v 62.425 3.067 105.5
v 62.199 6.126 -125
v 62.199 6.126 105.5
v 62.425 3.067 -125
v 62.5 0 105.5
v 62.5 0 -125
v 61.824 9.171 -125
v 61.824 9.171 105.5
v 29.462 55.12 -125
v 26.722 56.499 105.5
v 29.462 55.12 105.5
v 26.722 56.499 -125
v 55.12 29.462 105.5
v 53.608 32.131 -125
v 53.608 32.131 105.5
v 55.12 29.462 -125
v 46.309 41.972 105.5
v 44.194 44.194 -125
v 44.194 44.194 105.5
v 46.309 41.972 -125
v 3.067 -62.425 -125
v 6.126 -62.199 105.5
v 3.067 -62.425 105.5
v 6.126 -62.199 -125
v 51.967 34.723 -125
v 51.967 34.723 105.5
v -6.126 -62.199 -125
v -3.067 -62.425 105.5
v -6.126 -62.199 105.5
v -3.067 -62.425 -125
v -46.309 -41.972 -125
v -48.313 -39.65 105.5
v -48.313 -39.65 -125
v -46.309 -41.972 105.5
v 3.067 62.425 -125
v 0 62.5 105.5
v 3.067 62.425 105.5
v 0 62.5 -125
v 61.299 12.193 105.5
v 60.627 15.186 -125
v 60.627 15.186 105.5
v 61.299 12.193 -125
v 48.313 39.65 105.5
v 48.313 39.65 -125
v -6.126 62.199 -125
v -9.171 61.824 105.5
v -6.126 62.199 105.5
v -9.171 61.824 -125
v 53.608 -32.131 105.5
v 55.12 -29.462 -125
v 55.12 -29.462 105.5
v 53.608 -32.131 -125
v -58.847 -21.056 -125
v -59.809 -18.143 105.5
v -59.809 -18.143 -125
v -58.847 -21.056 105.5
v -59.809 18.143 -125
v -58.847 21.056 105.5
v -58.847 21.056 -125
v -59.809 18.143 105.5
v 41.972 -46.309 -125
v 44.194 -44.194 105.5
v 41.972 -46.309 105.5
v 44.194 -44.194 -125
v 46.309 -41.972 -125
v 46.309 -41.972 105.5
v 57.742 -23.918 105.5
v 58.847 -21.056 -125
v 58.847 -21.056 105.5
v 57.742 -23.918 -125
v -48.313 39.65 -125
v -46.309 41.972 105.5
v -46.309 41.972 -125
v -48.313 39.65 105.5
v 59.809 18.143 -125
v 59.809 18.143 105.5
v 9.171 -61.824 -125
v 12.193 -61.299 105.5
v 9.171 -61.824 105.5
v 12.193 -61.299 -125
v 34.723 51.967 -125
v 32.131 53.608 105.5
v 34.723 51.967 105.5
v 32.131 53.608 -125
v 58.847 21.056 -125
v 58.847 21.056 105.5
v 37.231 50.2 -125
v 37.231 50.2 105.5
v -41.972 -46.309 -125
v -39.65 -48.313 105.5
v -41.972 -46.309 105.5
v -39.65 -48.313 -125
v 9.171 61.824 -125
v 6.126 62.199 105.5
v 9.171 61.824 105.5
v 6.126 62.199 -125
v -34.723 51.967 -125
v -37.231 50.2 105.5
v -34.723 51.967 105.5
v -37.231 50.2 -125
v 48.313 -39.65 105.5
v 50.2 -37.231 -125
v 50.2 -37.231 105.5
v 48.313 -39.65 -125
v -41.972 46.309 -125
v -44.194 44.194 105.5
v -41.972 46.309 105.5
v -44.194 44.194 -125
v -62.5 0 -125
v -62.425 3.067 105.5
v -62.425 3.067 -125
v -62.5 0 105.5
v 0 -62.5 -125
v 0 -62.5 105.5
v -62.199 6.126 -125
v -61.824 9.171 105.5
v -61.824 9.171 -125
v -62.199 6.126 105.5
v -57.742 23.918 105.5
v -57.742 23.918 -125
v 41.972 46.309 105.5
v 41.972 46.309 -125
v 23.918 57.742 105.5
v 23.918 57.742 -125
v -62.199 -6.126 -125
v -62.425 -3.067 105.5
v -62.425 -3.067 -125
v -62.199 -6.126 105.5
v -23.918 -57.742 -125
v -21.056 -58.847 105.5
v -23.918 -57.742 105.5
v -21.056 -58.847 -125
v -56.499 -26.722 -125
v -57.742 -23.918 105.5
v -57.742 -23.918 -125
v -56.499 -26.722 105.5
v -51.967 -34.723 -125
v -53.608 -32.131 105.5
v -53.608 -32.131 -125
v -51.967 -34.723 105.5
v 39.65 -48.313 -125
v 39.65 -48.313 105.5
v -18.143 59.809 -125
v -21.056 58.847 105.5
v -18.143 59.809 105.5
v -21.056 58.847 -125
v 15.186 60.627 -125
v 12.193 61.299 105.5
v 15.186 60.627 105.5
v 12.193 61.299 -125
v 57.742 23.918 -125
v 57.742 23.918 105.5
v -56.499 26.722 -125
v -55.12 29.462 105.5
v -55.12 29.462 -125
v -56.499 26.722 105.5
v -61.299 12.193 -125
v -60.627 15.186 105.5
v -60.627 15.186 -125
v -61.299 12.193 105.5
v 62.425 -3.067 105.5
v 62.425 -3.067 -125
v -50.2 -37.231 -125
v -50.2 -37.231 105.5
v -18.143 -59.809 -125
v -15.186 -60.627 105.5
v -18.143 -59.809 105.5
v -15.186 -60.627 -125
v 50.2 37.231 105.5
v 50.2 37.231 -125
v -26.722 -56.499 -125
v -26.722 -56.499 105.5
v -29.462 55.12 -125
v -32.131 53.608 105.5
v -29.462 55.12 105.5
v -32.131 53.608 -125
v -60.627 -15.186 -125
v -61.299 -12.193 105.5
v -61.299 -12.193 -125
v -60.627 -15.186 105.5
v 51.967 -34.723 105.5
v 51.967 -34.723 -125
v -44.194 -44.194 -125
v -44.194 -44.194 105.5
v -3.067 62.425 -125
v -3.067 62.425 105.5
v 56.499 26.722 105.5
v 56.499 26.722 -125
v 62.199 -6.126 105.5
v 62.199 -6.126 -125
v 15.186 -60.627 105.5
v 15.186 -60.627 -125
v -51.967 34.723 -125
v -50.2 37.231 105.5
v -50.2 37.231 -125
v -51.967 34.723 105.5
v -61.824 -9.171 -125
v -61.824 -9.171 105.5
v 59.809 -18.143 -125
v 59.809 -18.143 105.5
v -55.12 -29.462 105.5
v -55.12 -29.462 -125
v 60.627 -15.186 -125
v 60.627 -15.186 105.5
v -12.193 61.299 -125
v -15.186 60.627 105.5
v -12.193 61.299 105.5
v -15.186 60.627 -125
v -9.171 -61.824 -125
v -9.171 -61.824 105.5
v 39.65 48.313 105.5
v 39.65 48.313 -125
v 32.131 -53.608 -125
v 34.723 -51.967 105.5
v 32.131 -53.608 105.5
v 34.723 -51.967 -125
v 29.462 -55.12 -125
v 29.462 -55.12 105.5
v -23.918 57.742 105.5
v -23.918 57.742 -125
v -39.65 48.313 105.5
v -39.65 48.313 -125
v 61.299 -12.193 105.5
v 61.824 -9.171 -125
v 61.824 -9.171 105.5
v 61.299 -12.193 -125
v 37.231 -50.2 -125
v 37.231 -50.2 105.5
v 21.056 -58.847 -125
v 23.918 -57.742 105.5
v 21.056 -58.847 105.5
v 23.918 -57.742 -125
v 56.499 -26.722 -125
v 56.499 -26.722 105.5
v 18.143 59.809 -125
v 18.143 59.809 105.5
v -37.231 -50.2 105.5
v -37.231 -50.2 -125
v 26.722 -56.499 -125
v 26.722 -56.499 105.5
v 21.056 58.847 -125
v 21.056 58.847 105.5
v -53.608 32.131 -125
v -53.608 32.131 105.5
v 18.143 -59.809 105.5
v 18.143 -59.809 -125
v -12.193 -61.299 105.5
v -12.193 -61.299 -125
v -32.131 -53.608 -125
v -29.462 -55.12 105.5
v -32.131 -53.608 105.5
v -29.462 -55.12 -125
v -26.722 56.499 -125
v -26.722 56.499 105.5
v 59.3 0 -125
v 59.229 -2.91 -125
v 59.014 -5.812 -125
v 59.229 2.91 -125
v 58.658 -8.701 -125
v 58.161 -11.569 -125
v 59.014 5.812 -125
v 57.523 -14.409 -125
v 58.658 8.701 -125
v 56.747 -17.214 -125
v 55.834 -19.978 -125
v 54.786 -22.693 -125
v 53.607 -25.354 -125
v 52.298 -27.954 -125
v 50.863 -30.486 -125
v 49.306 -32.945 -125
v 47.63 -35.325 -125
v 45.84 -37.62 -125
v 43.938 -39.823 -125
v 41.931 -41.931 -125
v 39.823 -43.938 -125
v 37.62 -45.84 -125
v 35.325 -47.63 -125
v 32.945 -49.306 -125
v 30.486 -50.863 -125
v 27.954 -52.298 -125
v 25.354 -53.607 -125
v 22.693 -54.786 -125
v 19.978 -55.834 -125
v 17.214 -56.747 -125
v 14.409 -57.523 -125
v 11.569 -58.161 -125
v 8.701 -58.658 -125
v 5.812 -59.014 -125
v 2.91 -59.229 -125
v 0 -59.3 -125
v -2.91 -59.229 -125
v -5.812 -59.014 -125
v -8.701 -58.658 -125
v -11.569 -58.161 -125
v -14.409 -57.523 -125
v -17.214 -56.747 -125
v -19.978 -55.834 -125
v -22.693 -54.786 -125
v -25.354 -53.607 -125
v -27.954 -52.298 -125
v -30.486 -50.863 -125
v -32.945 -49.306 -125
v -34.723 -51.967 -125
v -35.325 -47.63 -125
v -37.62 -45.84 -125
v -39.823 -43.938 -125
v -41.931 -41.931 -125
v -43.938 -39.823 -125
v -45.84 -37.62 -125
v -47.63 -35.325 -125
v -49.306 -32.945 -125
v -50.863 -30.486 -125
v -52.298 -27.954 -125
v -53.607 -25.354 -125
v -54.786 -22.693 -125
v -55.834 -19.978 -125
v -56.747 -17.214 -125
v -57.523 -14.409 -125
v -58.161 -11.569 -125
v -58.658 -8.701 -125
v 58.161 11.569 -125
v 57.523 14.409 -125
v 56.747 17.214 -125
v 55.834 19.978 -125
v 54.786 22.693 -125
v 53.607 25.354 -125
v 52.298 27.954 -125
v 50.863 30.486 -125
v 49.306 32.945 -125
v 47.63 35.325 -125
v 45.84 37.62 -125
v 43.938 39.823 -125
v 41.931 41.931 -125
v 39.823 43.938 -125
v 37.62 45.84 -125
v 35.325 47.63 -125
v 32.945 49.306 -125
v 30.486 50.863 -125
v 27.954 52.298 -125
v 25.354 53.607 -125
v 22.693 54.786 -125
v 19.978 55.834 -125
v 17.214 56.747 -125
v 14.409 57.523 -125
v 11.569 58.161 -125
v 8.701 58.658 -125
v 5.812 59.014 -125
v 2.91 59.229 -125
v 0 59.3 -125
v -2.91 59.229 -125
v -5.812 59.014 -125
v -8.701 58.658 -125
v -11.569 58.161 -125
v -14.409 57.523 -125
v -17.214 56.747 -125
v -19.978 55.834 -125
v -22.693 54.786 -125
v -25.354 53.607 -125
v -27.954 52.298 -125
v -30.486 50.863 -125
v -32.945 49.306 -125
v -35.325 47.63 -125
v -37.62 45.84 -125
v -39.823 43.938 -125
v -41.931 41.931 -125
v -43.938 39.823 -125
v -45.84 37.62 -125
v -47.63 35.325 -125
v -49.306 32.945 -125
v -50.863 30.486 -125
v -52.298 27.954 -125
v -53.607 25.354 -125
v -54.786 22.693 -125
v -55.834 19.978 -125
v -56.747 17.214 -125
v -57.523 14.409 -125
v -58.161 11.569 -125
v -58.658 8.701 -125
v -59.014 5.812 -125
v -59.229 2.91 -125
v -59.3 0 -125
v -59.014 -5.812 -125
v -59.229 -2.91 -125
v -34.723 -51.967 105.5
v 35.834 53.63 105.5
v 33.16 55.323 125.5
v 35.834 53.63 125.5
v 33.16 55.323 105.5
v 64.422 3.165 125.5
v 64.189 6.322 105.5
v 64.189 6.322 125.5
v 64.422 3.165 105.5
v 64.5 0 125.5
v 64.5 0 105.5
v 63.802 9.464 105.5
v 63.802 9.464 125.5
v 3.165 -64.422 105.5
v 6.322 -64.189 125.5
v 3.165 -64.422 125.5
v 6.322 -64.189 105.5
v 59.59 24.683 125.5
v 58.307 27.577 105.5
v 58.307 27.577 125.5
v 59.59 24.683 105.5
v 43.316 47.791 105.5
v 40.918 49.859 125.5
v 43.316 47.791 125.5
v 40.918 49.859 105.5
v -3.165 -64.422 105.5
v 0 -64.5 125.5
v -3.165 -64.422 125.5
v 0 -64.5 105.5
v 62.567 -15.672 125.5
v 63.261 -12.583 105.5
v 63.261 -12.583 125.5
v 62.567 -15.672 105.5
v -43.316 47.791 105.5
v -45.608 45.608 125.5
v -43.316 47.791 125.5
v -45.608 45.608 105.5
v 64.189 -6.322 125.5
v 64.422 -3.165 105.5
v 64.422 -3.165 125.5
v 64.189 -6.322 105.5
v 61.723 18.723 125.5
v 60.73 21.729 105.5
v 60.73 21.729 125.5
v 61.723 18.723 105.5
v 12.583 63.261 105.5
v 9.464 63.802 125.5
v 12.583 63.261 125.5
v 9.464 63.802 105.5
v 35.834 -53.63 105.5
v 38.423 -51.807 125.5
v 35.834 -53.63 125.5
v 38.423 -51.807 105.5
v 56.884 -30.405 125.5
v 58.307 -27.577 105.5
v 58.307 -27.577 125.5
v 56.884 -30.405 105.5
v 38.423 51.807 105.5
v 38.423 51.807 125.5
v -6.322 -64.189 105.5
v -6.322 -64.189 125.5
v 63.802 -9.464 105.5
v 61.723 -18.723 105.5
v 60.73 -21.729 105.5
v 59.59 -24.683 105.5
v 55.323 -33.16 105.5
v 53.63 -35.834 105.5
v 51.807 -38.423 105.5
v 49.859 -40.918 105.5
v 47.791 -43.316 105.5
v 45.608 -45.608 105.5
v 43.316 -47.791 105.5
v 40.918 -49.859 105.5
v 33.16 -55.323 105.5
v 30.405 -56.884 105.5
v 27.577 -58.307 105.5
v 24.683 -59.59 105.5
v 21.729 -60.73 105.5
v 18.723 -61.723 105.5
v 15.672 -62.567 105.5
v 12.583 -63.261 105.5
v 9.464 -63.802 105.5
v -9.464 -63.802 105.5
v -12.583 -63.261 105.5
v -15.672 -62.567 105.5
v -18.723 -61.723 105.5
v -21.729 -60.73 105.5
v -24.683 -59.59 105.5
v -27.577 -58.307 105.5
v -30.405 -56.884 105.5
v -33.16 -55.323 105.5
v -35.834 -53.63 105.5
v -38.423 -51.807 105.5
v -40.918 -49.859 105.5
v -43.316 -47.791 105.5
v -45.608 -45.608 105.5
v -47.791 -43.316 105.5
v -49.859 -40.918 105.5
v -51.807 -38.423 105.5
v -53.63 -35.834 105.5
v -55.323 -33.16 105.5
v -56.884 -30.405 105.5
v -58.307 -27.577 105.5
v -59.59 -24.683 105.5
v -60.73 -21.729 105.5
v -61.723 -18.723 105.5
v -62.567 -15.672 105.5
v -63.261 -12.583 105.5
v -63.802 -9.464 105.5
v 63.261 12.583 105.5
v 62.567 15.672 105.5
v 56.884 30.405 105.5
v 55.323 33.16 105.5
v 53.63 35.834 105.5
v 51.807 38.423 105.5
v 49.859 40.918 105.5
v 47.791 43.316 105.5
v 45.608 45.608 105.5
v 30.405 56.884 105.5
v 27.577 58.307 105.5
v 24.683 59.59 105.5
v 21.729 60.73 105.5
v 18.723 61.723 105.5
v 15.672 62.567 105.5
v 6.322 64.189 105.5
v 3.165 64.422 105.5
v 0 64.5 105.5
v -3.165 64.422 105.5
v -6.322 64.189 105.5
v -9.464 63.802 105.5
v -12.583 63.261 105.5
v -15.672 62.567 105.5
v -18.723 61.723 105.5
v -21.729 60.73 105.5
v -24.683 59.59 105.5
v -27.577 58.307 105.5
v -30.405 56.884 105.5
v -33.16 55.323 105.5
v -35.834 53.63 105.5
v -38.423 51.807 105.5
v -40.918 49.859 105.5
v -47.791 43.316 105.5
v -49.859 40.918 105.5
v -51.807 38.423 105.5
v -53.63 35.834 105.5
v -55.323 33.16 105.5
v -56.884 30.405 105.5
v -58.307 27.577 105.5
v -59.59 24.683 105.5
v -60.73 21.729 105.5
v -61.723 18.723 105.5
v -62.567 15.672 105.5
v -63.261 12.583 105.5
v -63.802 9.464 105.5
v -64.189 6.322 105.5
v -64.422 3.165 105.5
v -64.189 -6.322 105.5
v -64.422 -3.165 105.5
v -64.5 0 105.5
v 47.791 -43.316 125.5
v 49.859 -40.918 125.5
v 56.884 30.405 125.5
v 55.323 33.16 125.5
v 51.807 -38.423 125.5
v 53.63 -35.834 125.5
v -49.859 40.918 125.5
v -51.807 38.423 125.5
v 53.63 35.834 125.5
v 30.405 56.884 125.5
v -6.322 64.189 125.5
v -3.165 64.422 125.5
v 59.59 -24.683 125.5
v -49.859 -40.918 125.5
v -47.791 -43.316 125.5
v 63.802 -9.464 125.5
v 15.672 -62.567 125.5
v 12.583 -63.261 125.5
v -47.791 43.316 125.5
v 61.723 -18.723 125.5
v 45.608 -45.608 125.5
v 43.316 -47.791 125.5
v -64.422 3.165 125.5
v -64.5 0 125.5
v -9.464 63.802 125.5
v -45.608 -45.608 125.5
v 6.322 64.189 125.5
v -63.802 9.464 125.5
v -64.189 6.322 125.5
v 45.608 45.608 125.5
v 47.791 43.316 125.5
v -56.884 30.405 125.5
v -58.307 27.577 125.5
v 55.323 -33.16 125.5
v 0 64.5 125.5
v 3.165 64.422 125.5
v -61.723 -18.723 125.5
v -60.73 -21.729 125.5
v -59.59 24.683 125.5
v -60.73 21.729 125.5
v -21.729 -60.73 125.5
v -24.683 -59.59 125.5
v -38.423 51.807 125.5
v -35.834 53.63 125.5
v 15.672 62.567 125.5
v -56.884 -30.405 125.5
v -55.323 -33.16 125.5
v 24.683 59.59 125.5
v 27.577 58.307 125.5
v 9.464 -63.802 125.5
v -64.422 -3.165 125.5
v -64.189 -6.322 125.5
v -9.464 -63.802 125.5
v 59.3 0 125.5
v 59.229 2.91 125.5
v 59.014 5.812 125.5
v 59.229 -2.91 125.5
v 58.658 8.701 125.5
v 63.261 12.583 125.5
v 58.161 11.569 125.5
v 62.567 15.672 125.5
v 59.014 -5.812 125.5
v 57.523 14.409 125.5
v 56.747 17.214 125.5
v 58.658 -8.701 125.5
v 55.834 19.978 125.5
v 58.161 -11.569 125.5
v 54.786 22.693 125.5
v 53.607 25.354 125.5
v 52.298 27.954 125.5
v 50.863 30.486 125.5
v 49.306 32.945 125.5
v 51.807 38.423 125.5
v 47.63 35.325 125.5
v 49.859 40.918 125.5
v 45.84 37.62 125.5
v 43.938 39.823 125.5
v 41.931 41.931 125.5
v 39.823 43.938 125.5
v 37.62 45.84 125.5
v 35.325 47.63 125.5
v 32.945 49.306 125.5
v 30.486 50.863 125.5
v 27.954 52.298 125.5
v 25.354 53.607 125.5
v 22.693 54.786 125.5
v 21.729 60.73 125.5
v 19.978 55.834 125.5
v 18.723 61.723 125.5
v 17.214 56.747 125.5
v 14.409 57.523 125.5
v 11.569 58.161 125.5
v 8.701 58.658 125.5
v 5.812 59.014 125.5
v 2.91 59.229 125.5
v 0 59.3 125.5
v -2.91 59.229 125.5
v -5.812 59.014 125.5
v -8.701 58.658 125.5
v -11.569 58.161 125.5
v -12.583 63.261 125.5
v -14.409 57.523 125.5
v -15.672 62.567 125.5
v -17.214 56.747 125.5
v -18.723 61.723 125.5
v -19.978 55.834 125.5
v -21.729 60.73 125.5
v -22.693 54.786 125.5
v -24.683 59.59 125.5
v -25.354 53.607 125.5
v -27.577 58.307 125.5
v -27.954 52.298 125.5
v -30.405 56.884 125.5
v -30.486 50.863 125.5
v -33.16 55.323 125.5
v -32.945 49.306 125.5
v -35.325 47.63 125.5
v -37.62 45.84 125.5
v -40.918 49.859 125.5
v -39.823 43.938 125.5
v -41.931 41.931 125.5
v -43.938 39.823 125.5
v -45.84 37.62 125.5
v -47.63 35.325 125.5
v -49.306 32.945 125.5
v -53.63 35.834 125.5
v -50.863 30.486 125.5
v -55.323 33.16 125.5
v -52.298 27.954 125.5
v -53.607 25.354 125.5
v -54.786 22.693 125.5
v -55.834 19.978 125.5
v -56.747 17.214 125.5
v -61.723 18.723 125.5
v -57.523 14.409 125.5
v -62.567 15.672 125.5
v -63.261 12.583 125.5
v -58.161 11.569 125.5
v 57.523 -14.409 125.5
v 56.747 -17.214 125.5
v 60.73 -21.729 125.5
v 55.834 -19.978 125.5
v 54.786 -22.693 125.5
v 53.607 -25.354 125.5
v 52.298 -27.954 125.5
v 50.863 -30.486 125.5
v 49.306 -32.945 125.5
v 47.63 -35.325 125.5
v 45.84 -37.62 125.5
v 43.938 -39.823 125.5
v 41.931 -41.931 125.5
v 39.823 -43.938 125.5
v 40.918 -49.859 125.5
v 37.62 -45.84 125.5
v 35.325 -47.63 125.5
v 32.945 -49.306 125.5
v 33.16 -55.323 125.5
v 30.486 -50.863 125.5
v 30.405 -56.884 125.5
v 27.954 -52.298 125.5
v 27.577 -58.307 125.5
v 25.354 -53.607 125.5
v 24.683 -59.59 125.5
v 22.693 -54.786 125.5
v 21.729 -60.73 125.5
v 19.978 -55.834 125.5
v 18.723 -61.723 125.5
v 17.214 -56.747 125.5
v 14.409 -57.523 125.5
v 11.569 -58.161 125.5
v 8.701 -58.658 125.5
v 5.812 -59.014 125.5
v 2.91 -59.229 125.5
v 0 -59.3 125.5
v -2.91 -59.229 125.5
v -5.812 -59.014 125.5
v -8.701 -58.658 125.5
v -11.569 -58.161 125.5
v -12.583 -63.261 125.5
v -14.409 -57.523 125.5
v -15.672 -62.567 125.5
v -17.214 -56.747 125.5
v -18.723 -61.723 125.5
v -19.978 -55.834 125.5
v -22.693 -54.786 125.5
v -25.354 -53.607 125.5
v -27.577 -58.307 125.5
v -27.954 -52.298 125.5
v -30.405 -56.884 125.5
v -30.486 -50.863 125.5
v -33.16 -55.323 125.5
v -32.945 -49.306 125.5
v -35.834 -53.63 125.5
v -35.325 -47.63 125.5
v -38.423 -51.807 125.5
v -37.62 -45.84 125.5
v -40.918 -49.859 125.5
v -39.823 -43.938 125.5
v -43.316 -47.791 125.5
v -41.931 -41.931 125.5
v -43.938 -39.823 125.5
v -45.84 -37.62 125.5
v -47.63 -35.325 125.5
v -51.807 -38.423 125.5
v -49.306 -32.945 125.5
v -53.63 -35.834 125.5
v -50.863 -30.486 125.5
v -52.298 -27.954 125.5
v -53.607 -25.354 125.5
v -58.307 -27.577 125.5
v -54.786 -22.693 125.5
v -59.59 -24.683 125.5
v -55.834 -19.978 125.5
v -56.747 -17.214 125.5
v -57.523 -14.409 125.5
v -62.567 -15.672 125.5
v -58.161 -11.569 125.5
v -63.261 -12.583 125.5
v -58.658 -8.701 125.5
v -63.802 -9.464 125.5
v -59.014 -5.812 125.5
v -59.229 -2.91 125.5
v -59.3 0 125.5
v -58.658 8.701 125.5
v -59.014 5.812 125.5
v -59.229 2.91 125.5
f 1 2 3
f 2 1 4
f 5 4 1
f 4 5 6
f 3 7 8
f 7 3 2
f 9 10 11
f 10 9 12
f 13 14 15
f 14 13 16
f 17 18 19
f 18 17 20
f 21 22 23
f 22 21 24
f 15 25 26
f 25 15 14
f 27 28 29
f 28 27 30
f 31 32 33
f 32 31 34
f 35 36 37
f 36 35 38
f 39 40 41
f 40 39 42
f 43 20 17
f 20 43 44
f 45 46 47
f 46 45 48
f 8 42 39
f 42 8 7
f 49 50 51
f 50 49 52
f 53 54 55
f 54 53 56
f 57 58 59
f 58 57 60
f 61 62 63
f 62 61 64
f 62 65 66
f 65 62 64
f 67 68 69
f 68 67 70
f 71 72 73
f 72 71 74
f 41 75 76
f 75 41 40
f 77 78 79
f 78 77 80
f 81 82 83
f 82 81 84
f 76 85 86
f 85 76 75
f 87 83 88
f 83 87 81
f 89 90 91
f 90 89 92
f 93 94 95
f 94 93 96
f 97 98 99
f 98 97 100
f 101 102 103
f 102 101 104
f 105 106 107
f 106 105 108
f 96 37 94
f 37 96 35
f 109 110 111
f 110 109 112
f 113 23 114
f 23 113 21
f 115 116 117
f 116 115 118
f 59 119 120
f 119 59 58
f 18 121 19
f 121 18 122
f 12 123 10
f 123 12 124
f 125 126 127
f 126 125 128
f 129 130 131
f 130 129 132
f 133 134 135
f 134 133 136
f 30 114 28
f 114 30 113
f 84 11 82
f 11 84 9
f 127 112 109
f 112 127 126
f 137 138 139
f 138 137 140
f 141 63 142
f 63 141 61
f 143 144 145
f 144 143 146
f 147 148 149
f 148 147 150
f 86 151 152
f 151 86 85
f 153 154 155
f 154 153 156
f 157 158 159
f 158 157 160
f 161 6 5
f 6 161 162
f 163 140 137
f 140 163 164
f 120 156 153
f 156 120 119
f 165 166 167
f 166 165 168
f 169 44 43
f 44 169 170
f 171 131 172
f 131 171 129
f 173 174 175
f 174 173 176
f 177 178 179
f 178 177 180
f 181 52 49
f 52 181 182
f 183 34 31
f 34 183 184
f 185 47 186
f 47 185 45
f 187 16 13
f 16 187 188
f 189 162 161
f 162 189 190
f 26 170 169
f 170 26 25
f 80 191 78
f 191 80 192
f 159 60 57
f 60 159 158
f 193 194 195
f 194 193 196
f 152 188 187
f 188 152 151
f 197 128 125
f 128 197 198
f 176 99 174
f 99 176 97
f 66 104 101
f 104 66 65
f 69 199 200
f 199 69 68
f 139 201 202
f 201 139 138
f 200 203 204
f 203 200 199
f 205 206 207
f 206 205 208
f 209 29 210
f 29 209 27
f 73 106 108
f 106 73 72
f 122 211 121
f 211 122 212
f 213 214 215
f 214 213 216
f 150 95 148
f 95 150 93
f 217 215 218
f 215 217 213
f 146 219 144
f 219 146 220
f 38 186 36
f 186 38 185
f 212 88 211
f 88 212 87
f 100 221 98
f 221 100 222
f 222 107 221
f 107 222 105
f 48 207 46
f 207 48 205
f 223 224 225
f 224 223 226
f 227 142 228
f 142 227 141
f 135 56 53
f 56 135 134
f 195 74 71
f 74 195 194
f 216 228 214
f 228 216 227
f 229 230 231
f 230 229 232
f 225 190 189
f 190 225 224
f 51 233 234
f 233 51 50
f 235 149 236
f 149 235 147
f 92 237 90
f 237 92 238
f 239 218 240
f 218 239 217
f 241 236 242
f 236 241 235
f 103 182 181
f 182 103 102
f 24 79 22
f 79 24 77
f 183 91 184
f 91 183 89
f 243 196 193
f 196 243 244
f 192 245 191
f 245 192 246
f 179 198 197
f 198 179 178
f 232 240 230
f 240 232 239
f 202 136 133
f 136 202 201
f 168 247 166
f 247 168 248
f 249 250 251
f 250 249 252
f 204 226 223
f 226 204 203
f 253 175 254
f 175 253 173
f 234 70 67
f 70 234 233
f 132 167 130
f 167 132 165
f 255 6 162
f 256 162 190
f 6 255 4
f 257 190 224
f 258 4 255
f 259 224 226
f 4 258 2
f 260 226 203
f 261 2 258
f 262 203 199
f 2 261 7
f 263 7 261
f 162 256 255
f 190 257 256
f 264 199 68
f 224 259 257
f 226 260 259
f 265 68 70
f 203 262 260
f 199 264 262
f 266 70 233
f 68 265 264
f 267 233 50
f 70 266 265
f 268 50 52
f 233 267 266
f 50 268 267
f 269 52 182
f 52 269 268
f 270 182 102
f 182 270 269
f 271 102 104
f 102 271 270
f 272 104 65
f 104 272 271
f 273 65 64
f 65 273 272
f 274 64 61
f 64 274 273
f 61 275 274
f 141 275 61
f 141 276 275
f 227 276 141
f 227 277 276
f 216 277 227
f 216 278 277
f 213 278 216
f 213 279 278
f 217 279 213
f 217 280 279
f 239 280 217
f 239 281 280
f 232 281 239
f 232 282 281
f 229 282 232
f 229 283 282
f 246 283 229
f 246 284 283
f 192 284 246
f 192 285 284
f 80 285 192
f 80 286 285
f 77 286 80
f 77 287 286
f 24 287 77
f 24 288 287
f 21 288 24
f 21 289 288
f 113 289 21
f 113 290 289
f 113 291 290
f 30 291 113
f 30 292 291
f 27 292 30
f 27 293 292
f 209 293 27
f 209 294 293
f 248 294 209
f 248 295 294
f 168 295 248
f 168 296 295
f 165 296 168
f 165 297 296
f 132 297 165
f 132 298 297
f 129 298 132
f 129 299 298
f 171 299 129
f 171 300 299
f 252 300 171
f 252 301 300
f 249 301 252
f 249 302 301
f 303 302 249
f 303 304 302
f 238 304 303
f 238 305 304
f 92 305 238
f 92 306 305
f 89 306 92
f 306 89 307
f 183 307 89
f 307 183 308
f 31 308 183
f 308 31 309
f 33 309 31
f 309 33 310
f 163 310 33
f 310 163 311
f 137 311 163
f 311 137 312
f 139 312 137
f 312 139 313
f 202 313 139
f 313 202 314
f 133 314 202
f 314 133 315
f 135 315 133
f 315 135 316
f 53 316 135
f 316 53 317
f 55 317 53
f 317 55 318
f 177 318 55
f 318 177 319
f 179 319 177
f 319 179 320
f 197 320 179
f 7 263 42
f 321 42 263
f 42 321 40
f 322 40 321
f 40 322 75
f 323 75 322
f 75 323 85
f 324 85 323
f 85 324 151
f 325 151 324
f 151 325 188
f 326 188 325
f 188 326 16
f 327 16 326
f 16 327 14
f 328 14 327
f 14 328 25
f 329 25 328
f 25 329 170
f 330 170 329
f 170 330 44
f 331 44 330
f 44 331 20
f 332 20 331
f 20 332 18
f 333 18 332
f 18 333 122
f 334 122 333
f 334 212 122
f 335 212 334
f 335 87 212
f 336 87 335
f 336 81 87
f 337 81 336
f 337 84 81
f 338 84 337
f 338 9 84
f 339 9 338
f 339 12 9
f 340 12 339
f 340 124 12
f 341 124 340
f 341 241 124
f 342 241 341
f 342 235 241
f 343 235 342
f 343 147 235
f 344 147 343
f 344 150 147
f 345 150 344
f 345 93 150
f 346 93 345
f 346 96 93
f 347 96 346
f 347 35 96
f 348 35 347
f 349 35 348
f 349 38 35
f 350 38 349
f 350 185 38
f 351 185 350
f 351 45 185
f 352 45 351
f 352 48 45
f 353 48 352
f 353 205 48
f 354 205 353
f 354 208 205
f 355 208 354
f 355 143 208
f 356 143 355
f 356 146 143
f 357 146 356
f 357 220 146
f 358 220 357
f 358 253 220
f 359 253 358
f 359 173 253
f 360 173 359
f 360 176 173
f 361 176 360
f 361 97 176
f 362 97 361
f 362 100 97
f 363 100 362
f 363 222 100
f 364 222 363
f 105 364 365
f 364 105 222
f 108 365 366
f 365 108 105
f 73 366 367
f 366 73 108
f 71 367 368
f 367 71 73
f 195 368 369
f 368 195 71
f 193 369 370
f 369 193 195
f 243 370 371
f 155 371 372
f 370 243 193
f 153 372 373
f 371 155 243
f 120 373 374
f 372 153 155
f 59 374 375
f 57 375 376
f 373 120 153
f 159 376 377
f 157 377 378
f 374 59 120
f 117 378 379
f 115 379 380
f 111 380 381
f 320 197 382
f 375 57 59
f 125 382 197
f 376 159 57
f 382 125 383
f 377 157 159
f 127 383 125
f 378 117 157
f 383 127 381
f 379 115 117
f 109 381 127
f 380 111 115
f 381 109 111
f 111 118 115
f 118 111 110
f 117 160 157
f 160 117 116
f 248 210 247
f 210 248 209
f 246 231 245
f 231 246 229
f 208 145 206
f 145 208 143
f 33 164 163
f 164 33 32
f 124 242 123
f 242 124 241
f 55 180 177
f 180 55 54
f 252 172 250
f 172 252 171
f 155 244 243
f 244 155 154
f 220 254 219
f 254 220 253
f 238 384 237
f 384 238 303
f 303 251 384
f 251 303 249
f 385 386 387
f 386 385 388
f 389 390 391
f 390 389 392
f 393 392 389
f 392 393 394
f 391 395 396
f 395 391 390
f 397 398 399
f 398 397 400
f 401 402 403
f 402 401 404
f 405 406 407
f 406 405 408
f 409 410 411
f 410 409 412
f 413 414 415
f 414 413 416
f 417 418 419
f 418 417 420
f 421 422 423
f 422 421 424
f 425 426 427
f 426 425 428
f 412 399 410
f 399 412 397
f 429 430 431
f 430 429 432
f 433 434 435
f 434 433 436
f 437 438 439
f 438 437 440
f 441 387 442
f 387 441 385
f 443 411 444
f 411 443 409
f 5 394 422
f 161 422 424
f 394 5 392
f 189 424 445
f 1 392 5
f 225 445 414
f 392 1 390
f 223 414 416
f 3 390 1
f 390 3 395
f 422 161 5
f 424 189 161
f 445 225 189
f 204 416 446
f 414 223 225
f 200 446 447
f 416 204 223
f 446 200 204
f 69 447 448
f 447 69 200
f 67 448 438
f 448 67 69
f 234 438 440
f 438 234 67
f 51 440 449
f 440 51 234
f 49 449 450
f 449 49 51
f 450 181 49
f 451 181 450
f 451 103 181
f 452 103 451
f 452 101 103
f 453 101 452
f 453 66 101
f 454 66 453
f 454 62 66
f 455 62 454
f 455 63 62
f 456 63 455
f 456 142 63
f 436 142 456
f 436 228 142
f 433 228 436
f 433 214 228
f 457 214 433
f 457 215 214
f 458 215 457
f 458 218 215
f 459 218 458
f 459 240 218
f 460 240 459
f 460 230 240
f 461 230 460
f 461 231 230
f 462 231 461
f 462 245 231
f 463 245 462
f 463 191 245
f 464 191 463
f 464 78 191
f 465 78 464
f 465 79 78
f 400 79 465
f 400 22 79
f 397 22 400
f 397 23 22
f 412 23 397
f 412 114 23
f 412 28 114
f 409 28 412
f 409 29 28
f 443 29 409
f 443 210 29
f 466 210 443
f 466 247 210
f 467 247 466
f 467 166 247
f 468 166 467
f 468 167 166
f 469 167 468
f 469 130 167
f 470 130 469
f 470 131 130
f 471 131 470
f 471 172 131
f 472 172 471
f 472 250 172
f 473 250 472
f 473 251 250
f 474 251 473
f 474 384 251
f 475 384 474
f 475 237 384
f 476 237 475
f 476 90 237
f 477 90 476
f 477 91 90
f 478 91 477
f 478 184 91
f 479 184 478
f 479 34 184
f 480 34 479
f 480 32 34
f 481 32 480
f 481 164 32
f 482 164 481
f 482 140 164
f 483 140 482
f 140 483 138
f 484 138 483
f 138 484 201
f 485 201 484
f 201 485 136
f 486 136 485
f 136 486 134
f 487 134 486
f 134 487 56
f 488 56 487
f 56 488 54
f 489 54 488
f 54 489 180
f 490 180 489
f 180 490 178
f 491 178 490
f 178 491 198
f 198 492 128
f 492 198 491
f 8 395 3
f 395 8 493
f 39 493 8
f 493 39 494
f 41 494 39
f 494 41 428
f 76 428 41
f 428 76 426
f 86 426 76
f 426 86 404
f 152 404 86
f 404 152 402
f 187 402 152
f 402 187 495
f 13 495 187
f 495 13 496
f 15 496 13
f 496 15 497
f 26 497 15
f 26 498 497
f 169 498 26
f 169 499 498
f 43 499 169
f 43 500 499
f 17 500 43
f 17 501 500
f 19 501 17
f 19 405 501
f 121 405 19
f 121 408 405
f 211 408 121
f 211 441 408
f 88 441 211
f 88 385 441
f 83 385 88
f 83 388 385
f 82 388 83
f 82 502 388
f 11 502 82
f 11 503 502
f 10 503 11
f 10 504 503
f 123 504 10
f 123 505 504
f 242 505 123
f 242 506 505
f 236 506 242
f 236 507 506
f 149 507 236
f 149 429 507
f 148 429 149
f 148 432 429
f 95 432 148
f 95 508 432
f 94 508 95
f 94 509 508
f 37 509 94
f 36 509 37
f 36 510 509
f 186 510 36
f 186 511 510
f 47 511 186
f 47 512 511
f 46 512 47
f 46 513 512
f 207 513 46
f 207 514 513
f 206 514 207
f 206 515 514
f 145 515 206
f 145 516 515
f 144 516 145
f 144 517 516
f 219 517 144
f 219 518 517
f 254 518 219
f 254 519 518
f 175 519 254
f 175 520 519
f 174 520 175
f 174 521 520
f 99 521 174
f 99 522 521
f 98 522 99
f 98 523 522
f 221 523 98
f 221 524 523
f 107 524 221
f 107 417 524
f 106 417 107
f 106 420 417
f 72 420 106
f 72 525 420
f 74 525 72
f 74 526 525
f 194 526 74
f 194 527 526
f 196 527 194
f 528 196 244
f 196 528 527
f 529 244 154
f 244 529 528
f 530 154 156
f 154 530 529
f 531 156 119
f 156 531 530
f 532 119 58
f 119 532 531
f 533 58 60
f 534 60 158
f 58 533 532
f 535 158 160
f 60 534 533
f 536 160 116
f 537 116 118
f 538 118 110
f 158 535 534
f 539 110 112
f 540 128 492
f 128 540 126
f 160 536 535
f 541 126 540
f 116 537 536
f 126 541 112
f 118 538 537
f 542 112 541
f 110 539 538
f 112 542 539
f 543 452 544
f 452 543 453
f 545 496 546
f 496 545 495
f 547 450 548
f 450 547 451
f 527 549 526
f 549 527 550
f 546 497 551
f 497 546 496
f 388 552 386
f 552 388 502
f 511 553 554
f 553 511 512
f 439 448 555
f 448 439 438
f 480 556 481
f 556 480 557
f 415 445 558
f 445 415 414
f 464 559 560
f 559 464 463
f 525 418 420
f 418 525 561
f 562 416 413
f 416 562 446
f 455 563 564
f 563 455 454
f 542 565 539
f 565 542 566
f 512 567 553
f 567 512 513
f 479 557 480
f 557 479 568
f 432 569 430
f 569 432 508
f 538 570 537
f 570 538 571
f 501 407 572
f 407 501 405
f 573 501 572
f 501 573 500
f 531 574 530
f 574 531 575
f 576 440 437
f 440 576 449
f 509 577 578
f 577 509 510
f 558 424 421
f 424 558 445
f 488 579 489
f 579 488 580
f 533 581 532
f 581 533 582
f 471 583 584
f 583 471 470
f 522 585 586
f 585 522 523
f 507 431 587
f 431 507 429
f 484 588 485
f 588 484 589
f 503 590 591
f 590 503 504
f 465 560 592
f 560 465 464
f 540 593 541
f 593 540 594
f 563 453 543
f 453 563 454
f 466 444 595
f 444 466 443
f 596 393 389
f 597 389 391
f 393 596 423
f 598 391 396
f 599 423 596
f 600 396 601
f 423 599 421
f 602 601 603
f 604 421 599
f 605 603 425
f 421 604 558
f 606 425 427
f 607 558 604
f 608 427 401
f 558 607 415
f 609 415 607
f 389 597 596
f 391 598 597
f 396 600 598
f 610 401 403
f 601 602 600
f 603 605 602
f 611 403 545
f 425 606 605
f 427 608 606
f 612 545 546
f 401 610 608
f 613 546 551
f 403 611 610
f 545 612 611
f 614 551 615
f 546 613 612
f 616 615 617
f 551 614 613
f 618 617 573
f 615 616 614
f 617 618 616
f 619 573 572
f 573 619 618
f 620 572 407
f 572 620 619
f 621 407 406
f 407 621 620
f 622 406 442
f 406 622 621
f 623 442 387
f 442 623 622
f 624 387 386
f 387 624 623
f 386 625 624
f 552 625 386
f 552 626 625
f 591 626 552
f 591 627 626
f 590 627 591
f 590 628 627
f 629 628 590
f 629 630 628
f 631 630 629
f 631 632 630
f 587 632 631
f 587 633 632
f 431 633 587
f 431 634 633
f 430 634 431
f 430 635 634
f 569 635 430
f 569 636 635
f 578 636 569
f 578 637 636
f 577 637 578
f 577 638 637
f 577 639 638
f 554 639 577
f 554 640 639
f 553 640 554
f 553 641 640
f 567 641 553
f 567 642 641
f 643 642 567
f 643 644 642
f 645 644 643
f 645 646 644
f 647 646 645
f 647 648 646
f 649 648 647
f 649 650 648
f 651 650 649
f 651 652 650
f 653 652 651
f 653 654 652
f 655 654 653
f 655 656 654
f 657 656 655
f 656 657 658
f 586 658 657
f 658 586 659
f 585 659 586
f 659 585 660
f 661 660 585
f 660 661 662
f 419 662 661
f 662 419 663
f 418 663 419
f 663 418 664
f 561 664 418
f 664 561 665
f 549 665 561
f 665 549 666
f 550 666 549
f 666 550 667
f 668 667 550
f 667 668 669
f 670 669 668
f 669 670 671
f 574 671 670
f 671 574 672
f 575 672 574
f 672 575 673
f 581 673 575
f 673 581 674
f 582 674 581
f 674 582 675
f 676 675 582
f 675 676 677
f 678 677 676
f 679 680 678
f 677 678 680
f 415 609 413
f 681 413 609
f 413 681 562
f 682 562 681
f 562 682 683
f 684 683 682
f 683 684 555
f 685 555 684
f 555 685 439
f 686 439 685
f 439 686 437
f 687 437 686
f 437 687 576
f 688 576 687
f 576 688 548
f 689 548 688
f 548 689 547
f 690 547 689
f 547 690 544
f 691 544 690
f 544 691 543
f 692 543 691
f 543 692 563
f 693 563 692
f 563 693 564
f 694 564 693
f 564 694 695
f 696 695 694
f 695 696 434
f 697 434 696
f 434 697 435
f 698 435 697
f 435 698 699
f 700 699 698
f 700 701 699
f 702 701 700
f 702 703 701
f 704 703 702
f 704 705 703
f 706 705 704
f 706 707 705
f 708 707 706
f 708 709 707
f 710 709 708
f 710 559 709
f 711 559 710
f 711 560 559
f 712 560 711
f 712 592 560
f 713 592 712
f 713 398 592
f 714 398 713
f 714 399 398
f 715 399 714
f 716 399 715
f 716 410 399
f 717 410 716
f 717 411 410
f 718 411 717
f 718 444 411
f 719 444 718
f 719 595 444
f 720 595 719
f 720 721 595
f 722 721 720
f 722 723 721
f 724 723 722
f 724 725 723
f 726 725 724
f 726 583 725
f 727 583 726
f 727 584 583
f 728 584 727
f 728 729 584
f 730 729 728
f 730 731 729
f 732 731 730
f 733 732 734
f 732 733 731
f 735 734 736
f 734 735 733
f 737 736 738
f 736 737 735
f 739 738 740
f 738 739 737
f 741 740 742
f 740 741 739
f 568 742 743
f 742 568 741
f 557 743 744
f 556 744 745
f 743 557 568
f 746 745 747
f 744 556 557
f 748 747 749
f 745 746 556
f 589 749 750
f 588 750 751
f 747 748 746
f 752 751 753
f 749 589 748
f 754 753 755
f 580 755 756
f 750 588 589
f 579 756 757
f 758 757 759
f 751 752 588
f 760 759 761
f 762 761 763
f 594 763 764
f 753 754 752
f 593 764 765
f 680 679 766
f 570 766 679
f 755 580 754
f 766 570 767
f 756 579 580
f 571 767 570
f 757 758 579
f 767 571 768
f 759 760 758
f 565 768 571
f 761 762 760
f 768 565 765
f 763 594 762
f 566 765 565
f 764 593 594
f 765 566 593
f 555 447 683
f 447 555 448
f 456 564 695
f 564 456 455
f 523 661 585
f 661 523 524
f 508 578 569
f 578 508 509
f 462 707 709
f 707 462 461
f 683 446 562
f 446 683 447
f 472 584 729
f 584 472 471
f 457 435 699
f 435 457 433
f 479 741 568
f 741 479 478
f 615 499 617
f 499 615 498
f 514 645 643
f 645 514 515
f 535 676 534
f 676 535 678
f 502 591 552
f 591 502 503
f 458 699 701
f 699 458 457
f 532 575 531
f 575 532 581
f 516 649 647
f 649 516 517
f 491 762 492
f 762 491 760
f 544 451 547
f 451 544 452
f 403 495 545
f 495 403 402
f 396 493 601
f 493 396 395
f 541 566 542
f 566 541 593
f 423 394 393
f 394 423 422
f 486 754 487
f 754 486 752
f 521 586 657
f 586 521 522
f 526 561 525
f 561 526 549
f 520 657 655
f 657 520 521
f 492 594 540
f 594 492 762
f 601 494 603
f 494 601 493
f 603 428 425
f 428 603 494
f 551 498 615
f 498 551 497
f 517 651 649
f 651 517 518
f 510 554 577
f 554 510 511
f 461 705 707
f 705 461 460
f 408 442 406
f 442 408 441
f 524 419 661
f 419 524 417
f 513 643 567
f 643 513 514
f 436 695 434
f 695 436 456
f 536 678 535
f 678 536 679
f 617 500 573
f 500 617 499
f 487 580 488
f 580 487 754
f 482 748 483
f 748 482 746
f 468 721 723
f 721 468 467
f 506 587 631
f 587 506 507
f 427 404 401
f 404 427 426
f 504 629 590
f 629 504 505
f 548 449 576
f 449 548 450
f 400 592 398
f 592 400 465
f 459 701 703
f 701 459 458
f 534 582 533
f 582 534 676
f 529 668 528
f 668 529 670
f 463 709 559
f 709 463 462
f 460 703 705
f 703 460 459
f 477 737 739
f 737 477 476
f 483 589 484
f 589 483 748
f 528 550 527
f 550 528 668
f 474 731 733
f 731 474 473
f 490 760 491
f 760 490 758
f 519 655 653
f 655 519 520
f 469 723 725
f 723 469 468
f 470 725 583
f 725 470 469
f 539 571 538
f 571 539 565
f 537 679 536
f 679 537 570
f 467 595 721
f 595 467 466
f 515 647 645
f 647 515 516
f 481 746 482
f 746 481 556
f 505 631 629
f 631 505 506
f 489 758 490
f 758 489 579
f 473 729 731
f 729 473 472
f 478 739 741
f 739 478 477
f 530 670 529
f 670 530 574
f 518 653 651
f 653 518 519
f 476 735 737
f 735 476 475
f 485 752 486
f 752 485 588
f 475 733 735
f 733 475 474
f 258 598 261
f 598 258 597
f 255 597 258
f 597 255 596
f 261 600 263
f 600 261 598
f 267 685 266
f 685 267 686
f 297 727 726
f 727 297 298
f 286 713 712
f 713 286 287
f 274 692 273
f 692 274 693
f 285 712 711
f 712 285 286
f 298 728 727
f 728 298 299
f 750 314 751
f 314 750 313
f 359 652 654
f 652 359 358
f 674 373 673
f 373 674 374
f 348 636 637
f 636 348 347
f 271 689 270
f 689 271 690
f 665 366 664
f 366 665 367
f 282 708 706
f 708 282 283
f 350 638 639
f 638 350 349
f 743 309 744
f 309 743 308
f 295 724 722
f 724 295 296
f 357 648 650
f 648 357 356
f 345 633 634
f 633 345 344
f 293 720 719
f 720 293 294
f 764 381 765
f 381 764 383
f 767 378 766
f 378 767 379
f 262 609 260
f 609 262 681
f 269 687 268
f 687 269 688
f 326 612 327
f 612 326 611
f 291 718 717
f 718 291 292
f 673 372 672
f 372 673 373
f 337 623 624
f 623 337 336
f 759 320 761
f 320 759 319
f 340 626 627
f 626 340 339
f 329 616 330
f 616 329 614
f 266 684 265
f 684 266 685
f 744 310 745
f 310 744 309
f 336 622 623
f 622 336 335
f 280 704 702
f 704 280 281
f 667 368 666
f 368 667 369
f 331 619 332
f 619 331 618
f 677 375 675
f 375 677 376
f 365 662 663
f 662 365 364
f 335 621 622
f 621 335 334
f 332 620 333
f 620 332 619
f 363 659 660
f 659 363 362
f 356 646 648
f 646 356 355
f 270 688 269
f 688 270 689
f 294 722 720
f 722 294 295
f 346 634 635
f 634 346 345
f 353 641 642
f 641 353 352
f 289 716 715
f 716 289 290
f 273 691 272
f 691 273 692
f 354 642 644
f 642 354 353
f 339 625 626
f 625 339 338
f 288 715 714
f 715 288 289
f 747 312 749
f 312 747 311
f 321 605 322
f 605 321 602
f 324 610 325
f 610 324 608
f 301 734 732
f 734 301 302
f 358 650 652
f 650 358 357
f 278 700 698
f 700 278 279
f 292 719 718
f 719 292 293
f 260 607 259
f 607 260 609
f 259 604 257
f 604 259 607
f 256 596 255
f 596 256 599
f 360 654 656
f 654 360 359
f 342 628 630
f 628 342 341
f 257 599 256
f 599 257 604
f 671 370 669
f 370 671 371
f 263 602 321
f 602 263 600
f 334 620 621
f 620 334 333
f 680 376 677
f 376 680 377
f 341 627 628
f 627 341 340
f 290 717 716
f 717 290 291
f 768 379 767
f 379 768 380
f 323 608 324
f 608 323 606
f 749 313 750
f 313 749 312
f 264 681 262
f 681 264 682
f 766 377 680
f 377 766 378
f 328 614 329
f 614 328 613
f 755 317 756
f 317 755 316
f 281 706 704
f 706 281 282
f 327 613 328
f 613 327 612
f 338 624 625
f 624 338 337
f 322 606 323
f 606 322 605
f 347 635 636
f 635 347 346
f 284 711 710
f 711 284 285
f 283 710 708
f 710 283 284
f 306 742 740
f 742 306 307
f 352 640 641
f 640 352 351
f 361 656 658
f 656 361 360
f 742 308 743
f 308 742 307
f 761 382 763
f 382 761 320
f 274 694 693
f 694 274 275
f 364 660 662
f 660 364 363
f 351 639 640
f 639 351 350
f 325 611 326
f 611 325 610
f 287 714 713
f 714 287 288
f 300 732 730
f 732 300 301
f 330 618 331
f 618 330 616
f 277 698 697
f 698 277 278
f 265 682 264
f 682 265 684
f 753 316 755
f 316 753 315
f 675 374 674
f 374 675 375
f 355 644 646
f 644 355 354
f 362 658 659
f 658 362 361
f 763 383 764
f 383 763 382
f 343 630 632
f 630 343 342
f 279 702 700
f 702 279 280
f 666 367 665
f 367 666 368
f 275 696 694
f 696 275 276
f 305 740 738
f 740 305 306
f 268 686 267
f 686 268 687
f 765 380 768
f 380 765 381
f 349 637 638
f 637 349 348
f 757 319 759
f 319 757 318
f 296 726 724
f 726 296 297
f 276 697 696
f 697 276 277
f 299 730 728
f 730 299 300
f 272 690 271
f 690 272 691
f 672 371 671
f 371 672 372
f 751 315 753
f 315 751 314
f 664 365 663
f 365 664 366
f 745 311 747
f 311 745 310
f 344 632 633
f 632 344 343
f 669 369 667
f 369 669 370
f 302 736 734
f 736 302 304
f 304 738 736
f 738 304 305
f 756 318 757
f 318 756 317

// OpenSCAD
// Parameters
pipe_standard = 1; //[1:1:1]
nominal_size = 125; //[63:250:1]
length_mm = 250; //[125:500:1]
pipe_od = 125; //[63:250:1]
pipe_wall = 3.2; //[1.6:6.4:0.1]
interface_length = 20; //[10:40:1]
interface_radial_add = 2; //[1:6:0.5]
connect_overlap = 1; //[0.5:2:0.1]

$fn = 128;

module ht_pipe() {
    od = pipe_od;
    wall = pipe_wall;
    id = od - 2*wall;

    sleeve_od = od + 2*interface_radial_add;

    // Robustness / non-degenerate geometry
    eps = 0.05;
    wall_safe = max(wall, eps);
    id_safe = max(od - 2*wall_safe, eps);
    overlap = max(connect_overlap, eps);

    // Sleeve placed at +Z end, overlapping into main pipe by "overlap"
    sleeve_center_z = (length_mm/2 - interface_length/2) + overlap/2;

    color([0.85, 0.85, 0.8])
    difference() {
        // OUTER: main OD + sleeve OD (connected by overlap)
        union() {
            cylinder(h=length_mm, r=od/2, center=true);

            translate([0, 0, sleeve_center_z])
                cylinder(h=interface_length, r=sleeve_od/2, center=true);
        }

        // INNER VOID: continuous bore through entire part (prevents blank/degenerate CSG)
        // Extend beyond both ends to guarantee a clean subtraction.
        cylinder(h=length_mm + interface_length + 4*overlap, r=id_safe/2, center=true);
    }
}

ht_pipe();
